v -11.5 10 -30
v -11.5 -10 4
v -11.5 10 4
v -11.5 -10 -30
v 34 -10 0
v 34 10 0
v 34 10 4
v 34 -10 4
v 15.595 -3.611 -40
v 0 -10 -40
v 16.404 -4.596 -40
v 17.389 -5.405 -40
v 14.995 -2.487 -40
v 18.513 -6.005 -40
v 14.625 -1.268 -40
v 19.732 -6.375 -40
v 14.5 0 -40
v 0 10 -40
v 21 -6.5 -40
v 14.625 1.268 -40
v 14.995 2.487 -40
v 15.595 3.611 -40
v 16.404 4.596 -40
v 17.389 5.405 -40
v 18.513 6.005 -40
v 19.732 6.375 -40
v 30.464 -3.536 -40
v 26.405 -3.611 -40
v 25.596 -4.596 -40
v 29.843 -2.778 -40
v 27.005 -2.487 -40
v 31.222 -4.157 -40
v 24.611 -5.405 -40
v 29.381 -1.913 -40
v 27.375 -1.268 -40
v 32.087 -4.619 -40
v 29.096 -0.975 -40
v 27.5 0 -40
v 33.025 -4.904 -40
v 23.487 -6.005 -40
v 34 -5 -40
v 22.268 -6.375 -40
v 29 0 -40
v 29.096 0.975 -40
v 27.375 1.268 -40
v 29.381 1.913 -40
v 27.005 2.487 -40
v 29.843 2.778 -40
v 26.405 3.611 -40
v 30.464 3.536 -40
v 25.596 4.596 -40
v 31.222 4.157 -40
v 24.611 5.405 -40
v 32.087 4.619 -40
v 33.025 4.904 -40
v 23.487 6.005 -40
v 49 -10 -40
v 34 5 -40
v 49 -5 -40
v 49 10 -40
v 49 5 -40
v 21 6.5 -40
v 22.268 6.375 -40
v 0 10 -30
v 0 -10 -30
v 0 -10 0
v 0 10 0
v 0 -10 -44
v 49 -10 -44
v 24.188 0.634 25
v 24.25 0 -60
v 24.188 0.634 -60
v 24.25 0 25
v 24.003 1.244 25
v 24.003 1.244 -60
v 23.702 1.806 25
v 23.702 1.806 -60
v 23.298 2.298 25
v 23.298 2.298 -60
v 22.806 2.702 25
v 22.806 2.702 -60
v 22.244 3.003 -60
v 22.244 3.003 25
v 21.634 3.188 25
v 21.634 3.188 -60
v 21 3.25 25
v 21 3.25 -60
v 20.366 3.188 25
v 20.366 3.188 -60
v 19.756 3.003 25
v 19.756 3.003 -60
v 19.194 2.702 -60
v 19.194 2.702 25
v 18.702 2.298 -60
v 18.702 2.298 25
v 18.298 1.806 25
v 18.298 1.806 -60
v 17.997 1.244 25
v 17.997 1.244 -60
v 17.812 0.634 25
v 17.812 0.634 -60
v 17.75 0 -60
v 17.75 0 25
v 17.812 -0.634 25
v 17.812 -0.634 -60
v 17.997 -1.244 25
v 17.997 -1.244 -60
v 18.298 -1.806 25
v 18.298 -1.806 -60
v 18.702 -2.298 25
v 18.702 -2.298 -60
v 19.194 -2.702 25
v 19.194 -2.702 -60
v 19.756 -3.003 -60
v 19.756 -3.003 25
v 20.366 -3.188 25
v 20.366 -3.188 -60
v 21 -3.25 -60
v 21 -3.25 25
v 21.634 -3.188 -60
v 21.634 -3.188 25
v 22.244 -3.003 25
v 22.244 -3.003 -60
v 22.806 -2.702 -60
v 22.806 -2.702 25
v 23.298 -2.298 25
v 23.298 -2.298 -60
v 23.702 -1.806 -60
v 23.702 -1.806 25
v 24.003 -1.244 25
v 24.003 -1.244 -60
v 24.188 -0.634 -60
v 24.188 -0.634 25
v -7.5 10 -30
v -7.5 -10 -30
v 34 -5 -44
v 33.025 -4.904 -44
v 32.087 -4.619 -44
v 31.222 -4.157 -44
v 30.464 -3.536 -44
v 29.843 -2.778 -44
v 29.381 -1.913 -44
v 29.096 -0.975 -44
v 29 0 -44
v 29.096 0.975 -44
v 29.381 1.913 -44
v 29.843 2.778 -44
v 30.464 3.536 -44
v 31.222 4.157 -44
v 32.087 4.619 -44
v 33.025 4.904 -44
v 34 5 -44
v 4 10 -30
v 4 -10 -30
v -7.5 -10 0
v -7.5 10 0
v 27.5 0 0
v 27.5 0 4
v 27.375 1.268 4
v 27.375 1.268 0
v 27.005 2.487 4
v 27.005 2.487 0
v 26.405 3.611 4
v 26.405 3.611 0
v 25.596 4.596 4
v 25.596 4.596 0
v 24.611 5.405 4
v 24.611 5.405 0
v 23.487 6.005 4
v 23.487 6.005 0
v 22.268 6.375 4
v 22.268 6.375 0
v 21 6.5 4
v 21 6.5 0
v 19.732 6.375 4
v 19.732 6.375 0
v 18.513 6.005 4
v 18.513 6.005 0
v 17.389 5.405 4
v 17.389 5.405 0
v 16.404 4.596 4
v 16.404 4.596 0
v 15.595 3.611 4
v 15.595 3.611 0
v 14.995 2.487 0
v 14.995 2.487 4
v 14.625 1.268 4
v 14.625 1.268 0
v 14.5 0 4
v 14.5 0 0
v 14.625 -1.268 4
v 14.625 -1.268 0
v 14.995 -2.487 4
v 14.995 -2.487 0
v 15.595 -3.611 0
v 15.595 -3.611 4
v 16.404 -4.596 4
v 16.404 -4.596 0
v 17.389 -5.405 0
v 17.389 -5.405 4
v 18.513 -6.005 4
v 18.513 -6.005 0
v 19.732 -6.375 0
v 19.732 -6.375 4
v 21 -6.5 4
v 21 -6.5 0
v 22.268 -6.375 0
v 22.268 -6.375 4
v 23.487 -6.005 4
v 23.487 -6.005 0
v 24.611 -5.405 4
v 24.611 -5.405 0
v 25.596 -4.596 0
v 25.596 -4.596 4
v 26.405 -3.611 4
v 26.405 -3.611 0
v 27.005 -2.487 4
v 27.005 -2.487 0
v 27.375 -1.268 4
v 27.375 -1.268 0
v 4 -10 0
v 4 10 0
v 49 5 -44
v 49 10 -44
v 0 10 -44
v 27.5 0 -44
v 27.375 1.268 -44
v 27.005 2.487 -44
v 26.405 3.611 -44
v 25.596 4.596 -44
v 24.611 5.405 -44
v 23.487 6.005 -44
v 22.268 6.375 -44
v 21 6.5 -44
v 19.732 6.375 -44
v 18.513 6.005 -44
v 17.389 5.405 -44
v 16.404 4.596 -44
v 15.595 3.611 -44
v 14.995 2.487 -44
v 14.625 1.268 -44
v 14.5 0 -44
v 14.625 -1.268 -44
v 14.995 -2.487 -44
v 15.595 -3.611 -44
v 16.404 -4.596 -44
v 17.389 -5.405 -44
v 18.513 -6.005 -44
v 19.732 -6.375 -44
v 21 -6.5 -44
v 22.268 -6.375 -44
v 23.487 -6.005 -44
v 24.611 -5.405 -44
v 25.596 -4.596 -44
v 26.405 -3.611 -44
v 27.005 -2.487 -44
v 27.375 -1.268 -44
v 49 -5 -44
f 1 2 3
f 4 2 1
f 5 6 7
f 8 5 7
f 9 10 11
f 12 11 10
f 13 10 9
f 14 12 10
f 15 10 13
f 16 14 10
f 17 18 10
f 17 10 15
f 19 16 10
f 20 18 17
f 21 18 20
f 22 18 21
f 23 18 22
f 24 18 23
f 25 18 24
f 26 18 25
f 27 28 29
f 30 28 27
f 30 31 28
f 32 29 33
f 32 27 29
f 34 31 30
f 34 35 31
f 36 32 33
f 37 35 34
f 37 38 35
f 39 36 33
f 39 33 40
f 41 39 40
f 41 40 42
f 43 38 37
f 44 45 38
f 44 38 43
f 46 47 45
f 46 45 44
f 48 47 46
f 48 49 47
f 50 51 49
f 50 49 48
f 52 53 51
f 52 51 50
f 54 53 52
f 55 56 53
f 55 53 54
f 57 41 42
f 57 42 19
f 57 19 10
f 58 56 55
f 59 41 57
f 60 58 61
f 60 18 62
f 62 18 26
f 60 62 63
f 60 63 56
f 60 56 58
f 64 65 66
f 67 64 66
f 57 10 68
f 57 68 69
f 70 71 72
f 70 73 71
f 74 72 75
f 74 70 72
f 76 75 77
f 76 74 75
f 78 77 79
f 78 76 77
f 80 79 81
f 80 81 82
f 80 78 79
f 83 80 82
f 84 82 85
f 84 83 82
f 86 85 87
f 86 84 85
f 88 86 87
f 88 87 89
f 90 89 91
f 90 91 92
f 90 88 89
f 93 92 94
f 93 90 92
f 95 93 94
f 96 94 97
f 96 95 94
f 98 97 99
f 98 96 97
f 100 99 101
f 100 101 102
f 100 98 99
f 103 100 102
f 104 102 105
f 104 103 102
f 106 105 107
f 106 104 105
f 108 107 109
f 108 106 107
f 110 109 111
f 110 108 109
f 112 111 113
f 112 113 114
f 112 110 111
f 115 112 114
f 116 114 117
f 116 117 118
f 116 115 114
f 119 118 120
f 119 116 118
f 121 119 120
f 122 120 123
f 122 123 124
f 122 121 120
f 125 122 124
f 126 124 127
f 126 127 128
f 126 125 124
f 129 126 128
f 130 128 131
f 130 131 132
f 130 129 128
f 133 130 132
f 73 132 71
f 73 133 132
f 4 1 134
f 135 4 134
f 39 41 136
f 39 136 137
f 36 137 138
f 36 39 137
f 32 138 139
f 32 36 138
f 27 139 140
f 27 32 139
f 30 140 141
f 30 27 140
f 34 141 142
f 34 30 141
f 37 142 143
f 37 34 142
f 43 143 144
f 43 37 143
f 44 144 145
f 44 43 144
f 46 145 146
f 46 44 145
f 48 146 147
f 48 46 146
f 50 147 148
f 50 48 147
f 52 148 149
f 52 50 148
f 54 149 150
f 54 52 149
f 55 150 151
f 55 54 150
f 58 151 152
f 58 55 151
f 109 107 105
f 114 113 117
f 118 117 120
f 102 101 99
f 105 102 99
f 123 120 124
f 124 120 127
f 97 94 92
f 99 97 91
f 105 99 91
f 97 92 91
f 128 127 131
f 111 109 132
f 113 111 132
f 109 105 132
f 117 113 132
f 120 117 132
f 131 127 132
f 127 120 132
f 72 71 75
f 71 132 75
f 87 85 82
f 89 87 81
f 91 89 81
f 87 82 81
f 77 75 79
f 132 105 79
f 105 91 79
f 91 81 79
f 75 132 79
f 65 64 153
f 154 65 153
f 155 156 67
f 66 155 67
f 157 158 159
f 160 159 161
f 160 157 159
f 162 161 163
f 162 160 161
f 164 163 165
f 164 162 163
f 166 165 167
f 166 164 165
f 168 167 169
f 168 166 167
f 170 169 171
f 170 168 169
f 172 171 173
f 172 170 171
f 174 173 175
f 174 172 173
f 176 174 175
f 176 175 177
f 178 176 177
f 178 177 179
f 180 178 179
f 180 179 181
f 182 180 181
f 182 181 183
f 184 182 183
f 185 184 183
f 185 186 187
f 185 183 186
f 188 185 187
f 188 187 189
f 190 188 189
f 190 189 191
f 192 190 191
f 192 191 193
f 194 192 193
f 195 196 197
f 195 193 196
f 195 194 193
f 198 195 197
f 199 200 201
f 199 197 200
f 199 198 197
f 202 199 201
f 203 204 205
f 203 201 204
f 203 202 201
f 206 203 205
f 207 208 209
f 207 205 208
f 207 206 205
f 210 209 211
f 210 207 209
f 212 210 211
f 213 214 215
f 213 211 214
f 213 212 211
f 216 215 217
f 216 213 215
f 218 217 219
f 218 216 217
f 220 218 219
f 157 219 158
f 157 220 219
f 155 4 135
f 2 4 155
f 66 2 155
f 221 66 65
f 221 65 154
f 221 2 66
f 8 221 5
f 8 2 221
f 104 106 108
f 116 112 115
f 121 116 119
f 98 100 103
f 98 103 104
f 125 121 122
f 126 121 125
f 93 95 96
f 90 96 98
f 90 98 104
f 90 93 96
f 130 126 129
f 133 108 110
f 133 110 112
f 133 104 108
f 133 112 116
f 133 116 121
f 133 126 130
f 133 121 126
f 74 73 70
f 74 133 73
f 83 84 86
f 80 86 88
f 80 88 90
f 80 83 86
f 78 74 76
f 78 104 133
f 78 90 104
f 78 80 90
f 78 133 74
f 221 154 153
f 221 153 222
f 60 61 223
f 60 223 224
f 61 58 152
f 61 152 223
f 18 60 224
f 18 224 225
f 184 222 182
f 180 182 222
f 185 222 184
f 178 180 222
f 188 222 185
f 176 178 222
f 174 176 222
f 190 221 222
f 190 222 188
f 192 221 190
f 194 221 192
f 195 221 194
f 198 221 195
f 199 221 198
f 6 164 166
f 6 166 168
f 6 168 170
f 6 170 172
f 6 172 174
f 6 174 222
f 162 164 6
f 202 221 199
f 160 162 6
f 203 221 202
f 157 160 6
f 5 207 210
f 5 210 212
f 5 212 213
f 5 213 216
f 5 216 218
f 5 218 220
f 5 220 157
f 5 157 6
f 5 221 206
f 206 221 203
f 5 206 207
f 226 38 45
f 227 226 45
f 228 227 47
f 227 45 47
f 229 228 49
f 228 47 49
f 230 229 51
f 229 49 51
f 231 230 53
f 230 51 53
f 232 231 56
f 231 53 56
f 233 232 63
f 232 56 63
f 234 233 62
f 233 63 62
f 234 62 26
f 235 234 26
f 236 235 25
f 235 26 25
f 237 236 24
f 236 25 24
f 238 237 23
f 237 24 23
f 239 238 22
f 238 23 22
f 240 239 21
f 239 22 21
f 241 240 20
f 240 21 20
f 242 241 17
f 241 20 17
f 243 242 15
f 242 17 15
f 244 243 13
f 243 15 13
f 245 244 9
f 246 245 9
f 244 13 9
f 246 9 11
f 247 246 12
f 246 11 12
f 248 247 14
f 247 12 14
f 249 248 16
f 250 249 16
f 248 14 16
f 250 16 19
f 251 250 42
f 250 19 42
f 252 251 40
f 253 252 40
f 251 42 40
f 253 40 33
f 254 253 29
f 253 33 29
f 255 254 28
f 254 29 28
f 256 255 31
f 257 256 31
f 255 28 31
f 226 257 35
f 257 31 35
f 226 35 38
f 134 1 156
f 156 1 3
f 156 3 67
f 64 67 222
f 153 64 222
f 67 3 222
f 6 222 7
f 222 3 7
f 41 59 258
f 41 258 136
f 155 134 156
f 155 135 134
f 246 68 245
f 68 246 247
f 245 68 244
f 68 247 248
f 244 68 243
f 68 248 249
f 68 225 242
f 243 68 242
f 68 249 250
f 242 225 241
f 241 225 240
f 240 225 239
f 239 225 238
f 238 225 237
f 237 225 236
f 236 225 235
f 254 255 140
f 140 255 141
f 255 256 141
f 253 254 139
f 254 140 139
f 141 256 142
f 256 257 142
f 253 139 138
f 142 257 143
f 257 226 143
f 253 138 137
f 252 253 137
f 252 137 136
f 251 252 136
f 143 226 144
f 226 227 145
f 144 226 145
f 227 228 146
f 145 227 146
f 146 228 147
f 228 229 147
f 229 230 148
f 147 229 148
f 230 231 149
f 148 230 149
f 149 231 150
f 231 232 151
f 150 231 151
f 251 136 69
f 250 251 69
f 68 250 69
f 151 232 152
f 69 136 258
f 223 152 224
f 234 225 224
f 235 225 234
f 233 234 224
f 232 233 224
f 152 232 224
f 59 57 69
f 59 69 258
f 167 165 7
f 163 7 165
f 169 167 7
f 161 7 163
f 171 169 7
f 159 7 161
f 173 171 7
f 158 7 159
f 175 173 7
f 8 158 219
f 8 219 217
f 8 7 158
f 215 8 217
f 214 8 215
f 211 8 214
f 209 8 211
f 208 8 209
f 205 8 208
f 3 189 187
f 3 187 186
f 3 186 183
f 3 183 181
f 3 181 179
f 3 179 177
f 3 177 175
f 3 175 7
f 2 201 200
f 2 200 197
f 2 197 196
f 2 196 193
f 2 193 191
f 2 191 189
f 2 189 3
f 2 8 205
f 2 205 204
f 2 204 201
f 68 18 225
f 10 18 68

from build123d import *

# Parameters (mm, degrees)
F0_W          = 4
F0_H          = 30
F1_DEPTH      = 10
F1_DEPTH_BACK = 10
F2_R          = 6.5
F3_DEPTH      = 11.1
F4_R          = 3.25
F5_DEPTH      = 25
F5_DEPTH_BACK = 60
F7_R          = 6.5
F8_DEPTH      = 4


with BuildPart() as f1:
    # F0 (on Front) → F1 (new body, two sides)
    with BuildSketch(Plane.XZ) as f1_sk:
        with Locations((2, -15)):
            Rectangle(F0_W, F0_H)
        Polygon((-7.5, 0), (0, 0), (4, 0), (34, 0), (34, 4), (-11.5, 4), (-11.5, 0), align=None)
        with Locations((-9.5, -15)):
            Rectangle(F0_W, F0_H)
    extrude(amount=F1_DEPTH)
    extrude(f1_sk.sketch, amount=-F1_DEPTH_BACK)

    # F2 (on Top) → F3 (cut)
    with BuildSketch(Plane.XY):
        with Locations((21, 0)):
            Circle(F2_R)
    extrude(amount=F3_DEPTH, mode=Mode.SUBTRACT)


with BuildPart() as f5:
    # F4 (on Top) → F5 (new body, two sides)
    with BuildSketch(Plane.XY) as f5_sk:
        with Locations((21, 0)):
            Circle(F4_R)
    extrude(amount=F5_DEPTH)
    extrude(f5_sk.sketch, amount=-F5_DEPTH_BACK)


with BuildPart() as f8:
    # F7 (on offset) → F8 (new body)
    with BuildSketch(Plane.XY.offset(-40)):
        with BuildLine():
            Line((34, 10), (15, 10))
            Line((15, 10), (0, 10))
            Line((0, 10), (0, -10))
            Line((0, -10), (15, -10))
            Line((15, -10), (34, -10))
            Line((34, -10), (49, -10))
            Line((49, -10), (49, -5))
            Line((49, -5), (34, -5))
            ThreePointArc((34, -5), (29, 0), (34, 5))
            Line((34, 5), (49, 5))
            Line((49, 5), (49, 10))
            Line((49, 10), (34, 10))
        make_face()
        with Locations((21, 0)):
            Circle(F7_R, mode=Mode.SUBTRACT)
    extrude(amount=-F8_DEPTH)


solid = Compound([f1.part, f5.part, f8.part])
